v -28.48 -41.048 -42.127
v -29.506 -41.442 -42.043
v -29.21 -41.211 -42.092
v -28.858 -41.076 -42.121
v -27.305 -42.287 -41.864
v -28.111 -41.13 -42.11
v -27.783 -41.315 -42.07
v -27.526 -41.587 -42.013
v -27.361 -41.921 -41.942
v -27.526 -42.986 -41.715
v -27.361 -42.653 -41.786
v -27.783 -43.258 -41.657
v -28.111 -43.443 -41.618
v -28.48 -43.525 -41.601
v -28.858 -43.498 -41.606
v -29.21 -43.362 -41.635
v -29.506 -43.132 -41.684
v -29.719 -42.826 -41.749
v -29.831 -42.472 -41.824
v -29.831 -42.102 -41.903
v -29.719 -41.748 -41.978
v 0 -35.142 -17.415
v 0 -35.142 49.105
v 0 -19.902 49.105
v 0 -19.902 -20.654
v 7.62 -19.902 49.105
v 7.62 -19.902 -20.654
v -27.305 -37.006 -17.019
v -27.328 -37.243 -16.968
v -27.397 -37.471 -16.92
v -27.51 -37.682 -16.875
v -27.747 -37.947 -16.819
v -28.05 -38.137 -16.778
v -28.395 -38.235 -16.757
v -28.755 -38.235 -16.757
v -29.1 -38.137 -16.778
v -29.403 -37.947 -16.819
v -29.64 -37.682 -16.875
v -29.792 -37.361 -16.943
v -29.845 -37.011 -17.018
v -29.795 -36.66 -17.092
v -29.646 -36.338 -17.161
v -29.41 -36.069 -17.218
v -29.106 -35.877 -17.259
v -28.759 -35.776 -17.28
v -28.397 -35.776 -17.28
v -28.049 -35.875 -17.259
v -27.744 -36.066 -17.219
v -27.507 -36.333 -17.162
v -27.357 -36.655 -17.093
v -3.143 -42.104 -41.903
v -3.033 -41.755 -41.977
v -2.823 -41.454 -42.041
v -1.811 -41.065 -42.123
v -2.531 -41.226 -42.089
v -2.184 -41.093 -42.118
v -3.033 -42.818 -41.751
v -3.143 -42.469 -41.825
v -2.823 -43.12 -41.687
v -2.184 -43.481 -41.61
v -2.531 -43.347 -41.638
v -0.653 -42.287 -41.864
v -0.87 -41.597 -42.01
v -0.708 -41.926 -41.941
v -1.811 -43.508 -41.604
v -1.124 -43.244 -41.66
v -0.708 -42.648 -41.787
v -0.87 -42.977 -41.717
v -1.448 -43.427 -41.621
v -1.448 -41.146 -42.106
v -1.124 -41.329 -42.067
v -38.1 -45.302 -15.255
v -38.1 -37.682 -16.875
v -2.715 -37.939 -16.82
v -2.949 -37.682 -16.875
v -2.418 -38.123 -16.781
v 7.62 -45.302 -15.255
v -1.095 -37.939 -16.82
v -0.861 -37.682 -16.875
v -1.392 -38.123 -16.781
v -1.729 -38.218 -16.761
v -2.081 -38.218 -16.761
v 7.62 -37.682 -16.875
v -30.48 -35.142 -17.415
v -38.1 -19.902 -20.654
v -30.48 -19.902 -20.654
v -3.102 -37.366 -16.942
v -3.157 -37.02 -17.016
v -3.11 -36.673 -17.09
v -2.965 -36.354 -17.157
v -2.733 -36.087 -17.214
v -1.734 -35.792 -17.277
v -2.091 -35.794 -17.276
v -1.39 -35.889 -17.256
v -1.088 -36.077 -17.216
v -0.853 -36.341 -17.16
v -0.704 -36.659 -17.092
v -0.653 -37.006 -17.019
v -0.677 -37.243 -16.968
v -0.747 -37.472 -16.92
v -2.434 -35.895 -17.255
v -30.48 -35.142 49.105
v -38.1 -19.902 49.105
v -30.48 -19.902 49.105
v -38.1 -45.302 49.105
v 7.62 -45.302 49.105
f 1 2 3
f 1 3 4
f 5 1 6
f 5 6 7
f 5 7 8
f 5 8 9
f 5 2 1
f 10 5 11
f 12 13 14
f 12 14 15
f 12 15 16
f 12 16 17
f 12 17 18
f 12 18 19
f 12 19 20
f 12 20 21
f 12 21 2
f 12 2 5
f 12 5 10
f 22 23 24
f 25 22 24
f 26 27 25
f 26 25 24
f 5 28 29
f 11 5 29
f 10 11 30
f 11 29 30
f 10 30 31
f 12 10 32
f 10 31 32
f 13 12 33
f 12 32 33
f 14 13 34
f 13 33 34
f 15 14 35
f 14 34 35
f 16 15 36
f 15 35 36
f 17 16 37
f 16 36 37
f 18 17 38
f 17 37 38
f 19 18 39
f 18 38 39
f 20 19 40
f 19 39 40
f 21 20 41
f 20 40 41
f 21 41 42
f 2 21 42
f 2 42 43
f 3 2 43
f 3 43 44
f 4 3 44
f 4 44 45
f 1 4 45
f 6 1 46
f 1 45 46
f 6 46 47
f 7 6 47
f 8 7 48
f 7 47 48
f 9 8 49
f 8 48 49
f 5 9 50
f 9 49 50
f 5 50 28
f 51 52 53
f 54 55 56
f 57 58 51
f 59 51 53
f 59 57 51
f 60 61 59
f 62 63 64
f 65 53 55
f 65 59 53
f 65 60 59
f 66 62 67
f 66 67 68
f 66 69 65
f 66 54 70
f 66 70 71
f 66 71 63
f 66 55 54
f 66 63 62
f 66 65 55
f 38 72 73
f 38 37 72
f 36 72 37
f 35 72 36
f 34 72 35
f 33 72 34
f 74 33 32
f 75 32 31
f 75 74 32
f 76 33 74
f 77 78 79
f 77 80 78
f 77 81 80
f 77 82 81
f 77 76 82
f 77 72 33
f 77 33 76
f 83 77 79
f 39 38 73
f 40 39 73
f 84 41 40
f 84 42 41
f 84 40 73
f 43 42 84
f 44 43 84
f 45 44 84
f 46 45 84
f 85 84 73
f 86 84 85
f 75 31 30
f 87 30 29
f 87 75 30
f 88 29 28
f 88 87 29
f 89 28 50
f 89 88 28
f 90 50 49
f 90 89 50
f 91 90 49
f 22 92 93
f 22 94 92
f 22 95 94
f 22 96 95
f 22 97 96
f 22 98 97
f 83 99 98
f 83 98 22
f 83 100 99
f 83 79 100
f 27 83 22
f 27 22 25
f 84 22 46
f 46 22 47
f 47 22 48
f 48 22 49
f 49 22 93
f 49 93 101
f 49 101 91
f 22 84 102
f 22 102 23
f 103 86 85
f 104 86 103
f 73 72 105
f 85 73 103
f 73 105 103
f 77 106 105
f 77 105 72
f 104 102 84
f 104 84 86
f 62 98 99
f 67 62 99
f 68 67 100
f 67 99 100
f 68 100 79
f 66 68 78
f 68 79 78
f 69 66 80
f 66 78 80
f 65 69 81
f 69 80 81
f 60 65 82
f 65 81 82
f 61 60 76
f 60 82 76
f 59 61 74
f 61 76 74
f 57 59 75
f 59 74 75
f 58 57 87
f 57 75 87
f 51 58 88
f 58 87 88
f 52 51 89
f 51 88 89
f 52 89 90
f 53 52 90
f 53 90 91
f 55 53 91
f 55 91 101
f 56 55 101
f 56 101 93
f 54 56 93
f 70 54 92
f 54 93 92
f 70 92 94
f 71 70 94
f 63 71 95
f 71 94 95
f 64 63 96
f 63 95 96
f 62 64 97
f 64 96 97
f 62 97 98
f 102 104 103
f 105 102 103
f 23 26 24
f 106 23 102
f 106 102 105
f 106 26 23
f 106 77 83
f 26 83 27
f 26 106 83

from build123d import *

# Parameters (mm, degrees)
F1_DEPTH      = 7.62
F1_DEPTH_BACK = 38.1
F2_DEPTH      = 15.24
F3_W          = 30.48
F3_H          = 15.24
F4_DEPTH      = 152.4
F5_R          = 1.27
F5_R_2        = 1.2522055882
F6_DEPTH      = 25.4


# Not quite as in the source:
# - a feature names something its author has since deleted; it is built from what else it names


with BuildPart() as f1:
    # F0 (on Right) → F1 (new body, two sides)
    with BuildSketch(Plane.YZ) as f1_sk:
        Polygon((-19.9023338153, 49.1049804437), (-37.6823338153, 49.1049804437), (-37.6823338153, -16.8750494665), (-19.9023338153, -20.654305133), align=None)
        Polygon((-37.6823338153, 49.1049804437), (-45.3023338153, 49.1049804437), (-45.3023338153, -15.2553684666), (-37.6823338153, -16.8750494665), align=None)
    extrude(amount=F1_DEPTH)
    extrude(f1_sk.sketch, amount=-F1_DEPTH_BACK)

    # F0 (on Right) → F2 (join)
    with BuildSketch(Plane.YZ):
        Polygon((-37.6823338153, 49.1049804437), (-45.3023338153, 49.1049804437), (-45.3023338153, -15.2553684666), (-37.6823338153, -16.8750494665), align=None)
    extrude(amount=-F2_DEPTH)

    # F3 (on face) → F4 (cut)
    with BuildSketch(Plane.XY.offset(49.1049804437)):
        with Locations((-15.24, -27.5223338153)):
            Rectangle(F3_W, F3_H)
    extrude(amount=-F4_DEPTH, mode=Mode.SUBTRACT)

    # F5 (on face) → F6 (join)
    with BuildSketch(Plane(origin=(0, -5.0607549484, -23.8089801067), x_dir=(1, 0, 0), z_dir=(0, -0.2079116908, -0.9781476007))):
        with Locations((-28.575, 32.6586192333)):
            Circle(F5_R)
        with Locations((-1.905, 32.6586192333)):
            Circle(F5_R_2)
    extrude(amount=F6_DEPTH)


solid = f1.part
